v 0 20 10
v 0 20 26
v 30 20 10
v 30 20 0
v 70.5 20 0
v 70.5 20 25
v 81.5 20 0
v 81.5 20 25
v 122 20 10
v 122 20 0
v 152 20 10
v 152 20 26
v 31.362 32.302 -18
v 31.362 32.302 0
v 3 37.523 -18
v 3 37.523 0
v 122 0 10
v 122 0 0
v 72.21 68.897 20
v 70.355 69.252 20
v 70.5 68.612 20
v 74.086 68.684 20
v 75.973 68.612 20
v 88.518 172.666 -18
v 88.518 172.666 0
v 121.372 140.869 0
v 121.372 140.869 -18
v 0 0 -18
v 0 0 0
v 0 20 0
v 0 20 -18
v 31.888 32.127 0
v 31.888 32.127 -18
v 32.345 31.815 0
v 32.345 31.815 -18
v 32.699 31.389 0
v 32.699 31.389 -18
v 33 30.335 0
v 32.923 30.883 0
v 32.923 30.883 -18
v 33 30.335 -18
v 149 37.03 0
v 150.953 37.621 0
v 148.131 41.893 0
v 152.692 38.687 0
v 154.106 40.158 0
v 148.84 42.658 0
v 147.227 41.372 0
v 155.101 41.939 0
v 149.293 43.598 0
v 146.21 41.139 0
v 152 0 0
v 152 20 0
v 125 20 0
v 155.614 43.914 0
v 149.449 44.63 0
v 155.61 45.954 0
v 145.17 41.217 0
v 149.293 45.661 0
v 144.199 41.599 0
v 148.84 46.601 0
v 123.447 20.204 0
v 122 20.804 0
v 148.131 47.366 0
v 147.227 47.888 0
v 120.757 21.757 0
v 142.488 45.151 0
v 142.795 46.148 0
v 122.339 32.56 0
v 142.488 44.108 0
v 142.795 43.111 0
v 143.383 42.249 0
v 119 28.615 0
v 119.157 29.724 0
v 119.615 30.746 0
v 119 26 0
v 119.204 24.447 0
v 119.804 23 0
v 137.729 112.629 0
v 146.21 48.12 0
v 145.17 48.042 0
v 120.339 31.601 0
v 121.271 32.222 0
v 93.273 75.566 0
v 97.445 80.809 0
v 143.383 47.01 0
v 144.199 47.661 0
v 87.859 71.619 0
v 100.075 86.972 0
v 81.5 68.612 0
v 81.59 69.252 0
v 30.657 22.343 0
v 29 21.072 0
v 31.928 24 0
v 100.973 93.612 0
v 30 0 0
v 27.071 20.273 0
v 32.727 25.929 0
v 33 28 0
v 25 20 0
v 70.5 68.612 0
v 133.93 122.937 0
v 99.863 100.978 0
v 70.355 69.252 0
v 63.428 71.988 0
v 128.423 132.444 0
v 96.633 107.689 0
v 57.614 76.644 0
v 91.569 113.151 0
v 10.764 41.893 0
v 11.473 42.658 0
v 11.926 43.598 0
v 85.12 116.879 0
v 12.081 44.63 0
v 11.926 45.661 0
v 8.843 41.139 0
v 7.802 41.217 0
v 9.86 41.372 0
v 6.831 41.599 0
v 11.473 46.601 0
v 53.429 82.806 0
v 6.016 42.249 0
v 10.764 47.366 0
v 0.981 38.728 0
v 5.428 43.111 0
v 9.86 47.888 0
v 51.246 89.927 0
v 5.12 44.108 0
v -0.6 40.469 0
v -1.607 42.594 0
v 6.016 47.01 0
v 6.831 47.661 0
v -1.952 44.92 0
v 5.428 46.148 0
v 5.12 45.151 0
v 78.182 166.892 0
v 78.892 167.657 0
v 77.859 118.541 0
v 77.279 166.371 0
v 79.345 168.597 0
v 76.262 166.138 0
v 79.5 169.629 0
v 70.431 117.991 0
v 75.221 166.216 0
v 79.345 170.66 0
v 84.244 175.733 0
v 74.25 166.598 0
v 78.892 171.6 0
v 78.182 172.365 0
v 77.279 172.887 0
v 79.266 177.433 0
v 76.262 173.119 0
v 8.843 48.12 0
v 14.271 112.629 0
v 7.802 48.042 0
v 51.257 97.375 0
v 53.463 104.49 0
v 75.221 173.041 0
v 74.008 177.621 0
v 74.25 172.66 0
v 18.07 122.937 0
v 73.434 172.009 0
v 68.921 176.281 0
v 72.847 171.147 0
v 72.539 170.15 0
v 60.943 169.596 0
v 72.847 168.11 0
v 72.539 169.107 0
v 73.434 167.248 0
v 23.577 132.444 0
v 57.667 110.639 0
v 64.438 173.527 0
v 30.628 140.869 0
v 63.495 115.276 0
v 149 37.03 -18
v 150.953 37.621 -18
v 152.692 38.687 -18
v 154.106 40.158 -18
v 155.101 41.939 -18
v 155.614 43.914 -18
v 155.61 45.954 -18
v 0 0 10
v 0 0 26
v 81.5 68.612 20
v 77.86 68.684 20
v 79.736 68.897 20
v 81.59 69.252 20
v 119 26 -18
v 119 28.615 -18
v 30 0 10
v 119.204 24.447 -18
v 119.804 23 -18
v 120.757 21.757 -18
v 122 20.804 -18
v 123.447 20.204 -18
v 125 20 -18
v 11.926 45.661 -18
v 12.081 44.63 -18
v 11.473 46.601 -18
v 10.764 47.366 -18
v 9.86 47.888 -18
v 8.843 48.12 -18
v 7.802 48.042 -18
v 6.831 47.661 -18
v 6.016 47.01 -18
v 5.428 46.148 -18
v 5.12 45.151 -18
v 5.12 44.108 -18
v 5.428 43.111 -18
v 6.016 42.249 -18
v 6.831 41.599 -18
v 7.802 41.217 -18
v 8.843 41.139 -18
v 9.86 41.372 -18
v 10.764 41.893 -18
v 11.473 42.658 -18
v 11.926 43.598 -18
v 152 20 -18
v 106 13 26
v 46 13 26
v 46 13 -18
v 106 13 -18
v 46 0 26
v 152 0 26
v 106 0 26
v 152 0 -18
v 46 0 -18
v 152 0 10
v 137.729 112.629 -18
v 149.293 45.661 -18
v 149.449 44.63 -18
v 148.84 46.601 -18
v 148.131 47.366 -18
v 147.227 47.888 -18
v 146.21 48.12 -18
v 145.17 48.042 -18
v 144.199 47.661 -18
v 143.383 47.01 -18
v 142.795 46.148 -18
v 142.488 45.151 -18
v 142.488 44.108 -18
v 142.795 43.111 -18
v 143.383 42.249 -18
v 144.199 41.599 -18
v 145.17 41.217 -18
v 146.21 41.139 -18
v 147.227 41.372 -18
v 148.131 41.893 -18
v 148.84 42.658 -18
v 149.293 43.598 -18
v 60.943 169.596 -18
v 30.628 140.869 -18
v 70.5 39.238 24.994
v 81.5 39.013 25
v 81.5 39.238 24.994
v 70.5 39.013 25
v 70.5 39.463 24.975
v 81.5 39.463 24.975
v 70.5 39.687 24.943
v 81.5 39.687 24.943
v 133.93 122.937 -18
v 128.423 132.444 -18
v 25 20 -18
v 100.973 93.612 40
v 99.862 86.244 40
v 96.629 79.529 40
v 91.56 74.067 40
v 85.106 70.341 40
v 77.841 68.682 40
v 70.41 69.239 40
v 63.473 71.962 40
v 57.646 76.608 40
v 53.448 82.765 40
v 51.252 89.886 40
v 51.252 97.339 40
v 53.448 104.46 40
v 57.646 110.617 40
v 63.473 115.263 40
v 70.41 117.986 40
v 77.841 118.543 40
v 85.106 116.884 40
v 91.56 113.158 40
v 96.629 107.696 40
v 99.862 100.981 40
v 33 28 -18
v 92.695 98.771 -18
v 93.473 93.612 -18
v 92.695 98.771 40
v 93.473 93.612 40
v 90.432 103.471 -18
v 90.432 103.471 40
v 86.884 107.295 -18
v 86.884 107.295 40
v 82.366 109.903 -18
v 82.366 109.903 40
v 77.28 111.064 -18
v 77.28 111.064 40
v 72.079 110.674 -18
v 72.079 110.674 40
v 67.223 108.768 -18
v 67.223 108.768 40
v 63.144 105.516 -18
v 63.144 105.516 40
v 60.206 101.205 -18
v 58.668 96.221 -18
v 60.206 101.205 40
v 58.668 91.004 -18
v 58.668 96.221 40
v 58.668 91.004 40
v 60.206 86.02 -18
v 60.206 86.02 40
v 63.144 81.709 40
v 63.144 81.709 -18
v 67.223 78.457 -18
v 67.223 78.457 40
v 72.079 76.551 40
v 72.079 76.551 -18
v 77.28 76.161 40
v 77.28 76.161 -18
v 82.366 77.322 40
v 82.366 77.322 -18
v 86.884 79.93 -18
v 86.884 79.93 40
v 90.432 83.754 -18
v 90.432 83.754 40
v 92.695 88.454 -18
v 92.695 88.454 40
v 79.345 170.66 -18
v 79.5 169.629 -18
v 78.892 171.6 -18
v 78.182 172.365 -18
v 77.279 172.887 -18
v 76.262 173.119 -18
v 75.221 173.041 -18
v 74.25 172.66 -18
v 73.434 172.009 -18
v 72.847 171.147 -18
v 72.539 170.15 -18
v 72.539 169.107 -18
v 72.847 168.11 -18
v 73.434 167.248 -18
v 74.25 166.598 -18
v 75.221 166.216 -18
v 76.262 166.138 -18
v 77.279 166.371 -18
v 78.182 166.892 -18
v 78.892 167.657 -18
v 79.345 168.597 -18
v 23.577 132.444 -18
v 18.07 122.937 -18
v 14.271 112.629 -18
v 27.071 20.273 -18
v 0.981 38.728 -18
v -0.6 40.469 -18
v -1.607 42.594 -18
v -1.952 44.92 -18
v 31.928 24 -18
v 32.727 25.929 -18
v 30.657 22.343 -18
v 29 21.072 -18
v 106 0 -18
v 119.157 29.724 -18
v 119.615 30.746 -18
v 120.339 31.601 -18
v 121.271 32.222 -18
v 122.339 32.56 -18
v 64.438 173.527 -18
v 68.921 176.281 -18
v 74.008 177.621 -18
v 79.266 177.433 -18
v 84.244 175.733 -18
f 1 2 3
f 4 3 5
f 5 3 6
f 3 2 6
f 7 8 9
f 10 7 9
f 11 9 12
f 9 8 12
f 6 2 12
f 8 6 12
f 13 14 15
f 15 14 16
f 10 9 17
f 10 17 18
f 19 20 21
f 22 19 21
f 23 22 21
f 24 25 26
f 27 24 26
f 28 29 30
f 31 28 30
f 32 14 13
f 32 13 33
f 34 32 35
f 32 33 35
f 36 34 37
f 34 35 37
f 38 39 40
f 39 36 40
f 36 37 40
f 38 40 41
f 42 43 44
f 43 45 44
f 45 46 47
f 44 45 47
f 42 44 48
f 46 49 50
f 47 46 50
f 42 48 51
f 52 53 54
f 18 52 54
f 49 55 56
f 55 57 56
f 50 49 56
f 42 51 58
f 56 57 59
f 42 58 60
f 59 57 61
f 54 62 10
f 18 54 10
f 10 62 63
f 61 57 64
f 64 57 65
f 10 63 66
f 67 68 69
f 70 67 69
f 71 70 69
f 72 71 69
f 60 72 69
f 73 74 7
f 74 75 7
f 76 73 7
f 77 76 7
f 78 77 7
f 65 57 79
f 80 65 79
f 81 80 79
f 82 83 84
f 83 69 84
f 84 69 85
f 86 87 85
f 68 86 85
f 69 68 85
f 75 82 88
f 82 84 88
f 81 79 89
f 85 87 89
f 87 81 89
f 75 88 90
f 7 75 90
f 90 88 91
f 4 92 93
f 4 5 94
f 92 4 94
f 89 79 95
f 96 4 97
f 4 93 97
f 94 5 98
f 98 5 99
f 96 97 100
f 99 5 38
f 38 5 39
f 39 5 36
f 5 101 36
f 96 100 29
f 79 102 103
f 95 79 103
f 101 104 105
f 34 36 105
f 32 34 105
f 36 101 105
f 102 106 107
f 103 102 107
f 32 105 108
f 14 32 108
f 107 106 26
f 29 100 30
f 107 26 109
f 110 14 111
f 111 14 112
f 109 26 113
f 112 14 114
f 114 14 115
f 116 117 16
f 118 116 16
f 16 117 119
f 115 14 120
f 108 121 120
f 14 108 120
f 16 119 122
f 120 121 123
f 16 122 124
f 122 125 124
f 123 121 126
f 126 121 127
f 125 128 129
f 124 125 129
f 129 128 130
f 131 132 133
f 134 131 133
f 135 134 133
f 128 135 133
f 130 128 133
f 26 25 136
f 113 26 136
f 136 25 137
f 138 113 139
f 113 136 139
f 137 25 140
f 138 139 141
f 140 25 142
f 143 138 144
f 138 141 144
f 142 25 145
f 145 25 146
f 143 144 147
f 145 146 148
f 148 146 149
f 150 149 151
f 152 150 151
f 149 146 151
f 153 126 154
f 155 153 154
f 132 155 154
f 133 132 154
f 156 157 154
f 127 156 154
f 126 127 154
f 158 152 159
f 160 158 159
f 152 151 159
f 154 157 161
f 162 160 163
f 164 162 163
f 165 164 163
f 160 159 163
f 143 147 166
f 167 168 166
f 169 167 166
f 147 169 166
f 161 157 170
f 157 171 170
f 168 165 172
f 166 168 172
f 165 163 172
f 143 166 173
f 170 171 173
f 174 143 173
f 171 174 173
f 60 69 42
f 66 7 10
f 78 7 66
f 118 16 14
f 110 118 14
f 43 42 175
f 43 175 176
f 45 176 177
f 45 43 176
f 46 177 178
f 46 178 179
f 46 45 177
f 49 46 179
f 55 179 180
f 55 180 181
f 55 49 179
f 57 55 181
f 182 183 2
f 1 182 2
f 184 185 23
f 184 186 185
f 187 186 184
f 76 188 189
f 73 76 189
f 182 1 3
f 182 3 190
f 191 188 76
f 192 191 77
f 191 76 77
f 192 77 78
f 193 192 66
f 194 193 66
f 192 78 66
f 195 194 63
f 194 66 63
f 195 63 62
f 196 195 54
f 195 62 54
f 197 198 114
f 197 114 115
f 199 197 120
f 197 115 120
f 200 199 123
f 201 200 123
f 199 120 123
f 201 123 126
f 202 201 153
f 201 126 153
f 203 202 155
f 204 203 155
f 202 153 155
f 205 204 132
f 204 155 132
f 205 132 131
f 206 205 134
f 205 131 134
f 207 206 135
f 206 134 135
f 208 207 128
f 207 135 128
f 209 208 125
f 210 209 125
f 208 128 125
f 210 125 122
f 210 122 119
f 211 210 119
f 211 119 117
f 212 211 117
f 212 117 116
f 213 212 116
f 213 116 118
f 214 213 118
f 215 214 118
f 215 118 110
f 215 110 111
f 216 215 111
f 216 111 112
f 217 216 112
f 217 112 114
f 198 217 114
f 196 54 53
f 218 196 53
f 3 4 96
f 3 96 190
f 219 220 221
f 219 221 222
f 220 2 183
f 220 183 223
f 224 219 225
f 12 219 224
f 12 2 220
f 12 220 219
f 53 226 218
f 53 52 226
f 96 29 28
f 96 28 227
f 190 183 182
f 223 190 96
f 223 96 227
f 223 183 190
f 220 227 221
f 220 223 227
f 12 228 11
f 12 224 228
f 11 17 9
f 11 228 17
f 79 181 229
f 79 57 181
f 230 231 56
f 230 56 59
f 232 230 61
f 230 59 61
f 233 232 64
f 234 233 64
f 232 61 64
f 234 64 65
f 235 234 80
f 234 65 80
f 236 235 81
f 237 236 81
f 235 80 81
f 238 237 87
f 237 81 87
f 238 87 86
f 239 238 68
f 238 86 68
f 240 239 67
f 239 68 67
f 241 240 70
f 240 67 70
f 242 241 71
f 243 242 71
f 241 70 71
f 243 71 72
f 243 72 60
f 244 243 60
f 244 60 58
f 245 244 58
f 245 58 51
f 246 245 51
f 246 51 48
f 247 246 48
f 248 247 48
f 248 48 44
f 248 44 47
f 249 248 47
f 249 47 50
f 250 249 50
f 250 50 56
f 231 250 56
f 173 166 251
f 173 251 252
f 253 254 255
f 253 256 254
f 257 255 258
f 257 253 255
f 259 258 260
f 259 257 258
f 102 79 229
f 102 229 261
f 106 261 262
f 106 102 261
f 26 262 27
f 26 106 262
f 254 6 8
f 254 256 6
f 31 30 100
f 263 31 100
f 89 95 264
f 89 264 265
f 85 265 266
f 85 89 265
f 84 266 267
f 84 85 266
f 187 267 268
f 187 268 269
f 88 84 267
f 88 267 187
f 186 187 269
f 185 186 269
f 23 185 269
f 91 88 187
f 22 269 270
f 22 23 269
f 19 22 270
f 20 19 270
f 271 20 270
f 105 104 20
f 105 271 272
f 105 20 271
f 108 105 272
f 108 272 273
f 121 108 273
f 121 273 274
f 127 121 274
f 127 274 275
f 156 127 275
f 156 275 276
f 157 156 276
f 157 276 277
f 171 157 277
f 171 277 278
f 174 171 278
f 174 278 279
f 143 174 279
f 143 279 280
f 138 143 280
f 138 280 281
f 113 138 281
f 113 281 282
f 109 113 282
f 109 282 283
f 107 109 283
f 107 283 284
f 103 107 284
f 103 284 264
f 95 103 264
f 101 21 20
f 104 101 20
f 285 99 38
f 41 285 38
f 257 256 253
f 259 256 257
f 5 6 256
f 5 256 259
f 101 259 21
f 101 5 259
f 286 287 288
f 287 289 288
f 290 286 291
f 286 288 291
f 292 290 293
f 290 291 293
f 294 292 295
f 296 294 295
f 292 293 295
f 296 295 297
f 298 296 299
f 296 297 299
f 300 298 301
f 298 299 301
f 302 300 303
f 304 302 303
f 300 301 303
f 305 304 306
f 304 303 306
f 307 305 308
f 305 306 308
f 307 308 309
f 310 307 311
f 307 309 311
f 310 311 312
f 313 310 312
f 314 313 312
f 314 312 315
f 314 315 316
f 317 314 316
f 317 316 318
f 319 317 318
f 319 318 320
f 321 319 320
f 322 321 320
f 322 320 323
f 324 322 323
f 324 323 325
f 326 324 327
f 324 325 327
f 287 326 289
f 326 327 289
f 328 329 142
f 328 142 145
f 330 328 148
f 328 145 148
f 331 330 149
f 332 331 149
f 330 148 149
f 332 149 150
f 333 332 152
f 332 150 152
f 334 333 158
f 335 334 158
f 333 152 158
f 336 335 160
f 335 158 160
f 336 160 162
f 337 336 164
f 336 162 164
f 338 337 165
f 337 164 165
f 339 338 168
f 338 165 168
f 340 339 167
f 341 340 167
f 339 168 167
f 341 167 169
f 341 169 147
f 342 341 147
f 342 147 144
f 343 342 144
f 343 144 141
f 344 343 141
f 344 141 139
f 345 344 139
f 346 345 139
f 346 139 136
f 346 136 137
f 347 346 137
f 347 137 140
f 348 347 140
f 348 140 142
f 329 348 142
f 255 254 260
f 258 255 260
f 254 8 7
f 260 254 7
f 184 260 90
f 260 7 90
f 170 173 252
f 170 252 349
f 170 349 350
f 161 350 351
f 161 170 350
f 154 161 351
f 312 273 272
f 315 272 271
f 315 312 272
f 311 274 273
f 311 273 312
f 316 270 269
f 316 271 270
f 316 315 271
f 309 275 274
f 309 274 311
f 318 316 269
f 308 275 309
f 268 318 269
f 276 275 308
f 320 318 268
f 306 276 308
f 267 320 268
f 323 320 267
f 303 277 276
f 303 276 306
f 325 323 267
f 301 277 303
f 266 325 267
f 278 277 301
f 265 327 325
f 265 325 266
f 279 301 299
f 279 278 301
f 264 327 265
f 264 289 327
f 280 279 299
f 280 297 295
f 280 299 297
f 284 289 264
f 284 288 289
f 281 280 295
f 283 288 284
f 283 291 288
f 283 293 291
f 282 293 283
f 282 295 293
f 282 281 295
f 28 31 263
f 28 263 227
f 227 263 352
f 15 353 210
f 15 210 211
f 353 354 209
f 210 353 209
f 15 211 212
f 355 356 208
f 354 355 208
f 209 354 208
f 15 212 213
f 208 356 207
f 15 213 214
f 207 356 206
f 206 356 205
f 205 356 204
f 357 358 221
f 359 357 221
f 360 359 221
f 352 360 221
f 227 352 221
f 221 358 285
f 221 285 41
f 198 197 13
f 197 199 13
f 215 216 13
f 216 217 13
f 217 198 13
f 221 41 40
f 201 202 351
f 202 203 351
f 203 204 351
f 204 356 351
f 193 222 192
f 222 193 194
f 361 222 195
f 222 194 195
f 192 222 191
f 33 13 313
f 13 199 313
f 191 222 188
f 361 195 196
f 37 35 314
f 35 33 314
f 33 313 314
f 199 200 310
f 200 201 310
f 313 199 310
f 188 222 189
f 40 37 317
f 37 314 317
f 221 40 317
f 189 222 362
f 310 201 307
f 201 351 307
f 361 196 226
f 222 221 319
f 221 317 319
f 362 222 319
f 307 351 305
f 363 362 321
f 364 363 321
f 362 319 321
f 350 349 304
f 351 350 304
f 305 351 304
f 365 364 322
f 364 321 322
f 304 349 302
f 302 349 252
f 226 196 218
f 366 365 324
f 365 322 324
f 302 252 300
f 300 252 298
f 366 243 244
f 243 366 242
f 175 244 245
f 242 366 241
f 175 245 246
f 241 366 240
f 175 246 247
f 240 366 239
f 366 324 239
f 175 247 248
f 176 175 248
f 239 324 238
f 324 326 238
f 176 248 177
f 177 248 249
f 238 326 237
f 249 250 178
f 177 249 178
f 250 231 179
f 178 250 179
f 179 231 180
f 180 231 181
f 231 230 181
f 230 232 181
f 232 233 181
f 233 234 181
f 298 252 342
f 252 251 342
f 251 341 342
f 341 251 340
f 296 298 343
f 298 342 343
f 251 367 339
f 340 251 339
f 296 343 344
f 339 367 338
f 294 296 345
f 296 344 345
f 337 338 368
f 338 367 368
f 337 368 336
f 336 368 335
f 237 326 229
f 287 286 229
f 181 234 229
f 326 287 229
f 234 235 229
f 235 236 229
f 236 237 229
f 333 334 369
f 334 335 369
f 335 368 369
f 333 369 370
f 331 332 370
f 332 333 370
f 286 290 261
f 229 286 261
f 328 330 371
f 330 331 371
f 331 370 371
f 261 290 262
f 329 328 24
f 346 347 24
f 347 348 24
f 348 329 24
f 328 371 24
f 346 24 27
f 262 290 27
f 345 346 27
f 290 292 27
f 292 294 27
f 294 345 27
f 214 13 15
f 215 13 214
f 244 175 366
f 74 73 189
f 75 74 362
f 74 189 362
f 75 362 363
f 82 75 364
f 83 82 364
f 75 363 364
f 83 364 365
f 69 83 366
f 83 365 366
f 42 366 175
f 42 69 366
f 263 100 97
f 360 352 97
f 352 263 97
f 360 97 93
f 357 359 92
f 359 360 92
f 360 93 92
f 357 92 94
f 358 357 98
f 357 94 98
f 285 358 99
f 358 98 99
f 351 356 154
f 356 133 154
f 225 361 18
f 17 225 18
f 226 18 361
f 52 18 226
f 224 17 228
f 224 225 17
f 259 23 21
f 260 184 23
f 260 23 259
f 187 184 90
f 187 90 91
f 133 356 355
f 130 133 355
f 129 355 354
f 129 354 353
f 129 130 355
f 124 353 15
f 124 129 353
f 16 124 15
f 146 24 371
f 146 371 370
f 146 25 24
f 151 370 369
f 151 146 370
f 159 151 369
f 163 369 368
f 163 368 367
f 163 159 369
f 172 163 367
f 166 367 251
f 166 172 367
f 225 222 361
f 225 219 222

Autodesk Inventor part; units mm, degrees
ref_plane "YZ Plane" through (0, 0, 0) normal (1, 0, 0) x (0, 1, 0)
ref_plane "XZ Plane" through (0, 0, 0) normal (0, 1, 0) x (-1, 0, 0)
ref_plane "XY Plane" through (0, 0, 0) normal (0, 0, 1) x (1, 0, 0)
sketch "Sketch1" plane through (0, 0, 0) normal (0, 0, 1) x (1, 0, 0)
  line L0 (0, 0) -> (46, 0)
  line L1 (46, 0) -> (46, 13)
  line L2 (46, 13) -> (106, 13)
  line L3 (106, 13) -> (106, 0)
  line L4 (106, 0) -> (152, 0)
  line L5 (152, 0) -> (152, 20)
  line L6 (152, 20) -> (119, 20)
  line L7 (119, 20) -> (119, 32)
  line L8 (0, 0) -> (0, 20)
  line L9 (0, 20) -> (33, 20)
  line L10 (33, 20) -> (33, 32)
  arc A0 (88.5182, 172.6658) -> (60.9434, 169.5955) centre (76, 159.7315) ccw
  line L11 (88.5182, 172.6658) -> (121.3723, 140.8686)
  arc A1 (-1.0837, 48.545) -> (6.2613, 36.9223) centre (6.0476, 44.9195) ccw
  arc A2 (149, 37.0296) -> (155.0632, 47.9932) centre (147.6772, 44.9195) ccw
  line L12 (60.9434, 169.5955) -> (30.6277, 140.8686)
  line L13 (33, 32) -> (3, 37.5227)
  line L14 (119, 32) -> (149, 37.0296)
  line L15 (155.6101, 45.954) -> (137.729, 112.6291)
  line L16 (-1.9524, 44.9195) -> (14.271, 112.6291)
  arc A3 (137.9006, 111.9892) -> (119.6299, 142.555) centre (76, 95.7315) ccw
  arc A4 (33.3683, 143.4655) -> (13.316, 108.6436) centre (76, 95.7315) ccw
  point P0 (76, 13)
  dimension "d5" = 46
  dimension "d6" = 13
  dimension "d7" = 60
  dimension "d8" = 46
  dimension "d9" = 20
  dimension "d10" = 33
  dimension "d11" = 12
  dimension "d12" = 33
  dimension "d13" = 12
  dimension "d15" = 36
  dimension "d22" = 16
  dimension "d23" = 16
  dimension "d24" = 30
  dimension "d25" = 30
  dimension "d42" = 86
extrude "Extrusion1" add sketch "Sketch1" against normal blind 18 contours L8 L9 L10 L13 A1 L16 A4 L12 A0 L11 A3 L15 A2 L14 L7 L6 L5 L4 L3 L2 L1 L0
sketch "Sketch2" plane through (46, 0, 0) normal (1, 0, 0) x (0, 0, -1)
  point P0 (0, 0)
sketch "Sketch3" plane through (0, 0, 0) normal (0, 0, 1) x (1, 0, 0)
  line L0 (119, 20) -> (152, 20) projected
  line L1 (0, 20) -> (152, 20)
  line L2 (152, 20) -> (152, 0) projected
  line L3 (152, 20) -> (152, 0)
  line L4 (152, 0) -> (106, 0) projected
  line L5 (152, 0) -> (106, 0)
  line L6 (106, 0) -> (106, 13) projected
  line L7 (106, 0) -> (106, 13)
  line L8 (106, 13) -> (46, 13) projected
  line L9 (106, 13) -> (46, 13)
  line L10 (46, 13) -> (46, 0) projected
  line L11 (46, 13) -> (46, 0)
  line L12 (46, 0) -> (0, 0) projected
  line L13 (46, 0) -> (0, 0)
  line L14 (0, 0) -> (0, 20)
extrude "Extrusion2" add sketch "Sketch3" along normal blind 26
sketch "Sketch4" plane through (33, 20, 0) normal (0, 1, 0) x (1, 0, 0)
  point P0 (-33, 0)
sketch "Sketch5" plane through (152, 0, -18) normal (1, 0, 0) x (0, 0, -1)
  line L0 (0, 0) -> (-44, 0) projected
  line L1 (-28, 0) -> (-28, 20)
  line L2 (0, 20) -> (-44, 20) projected
  line L3 (-28, 20) -> (-18, 20)
  line L4 (-18, 20) -> (-18, 0)
  dimension "d32" = 16
  dimension "d33" = 10
extrude "Extrusion3" cut sketch "Sketch5" against normal blind 30
sketch "Sketch6" plane through (0, 0, 0) normal (0, 0, 1) x (1, 0, 0)
  line L0 (119, 20) -> (152, 20) projected
  point P0 (0, 0)
fillet "Fillet1" radius 4 1 edges at (119, 32, -9)
fillet "Fillet2" radius 6 1 edges at (119, 20, -9)
sketch "Sketch7" plane through (0, 0, -18) normal (-1, 0, 0) x (0, 0, 1)
  line L0 (0, 0) -> (44, 0) projected
  line L1 (18, 0) -> (18, 20)
  line L2 (18, 20) -> (0, 20) projected
  line L3 (18, 20) -> (28, 20)
  line L4 (0, 20) -> (44, 20) projected
  line L5 (28, 20) -> (28, 0)
  dimension "d38" = 18
  dimension "d39" = 10
extrude "Extrusion4" cut sketch "Sketch7" against normal blind 30
sketch "Sketch8" plane through (0, 0, 0) normal (0, 0, 1) x (1, 0, 0)
  point P0 (0, 0)
fillet "Fillet3" radius 8 1 edges at (33, 20, -9)
fillet "Fillet4" radius 2 1 edges at (33, 32, -9)
sketch "Sketch9" plane through (0, 0, 0) normal (0, 0, 1) x (1, 0, 0)
  line L0 (46, 13) -> (106, 13) projected
  arc A0 (88.5182, 172.6658) -> (60.9434, 169.5955) centre (76, 159.7315) ccw projected
  line L1 (76, 68) -> (76, 20)
  line L2 (30, 20) -> (122, 20) projected
  line L3 (76, 20) -> (81.5, 20)
  line L4 (81.5, 20) -> (81.5, 68.6125)
  line L5 (76, 20) -> (70.5, 20)
  line L6 (70.5, 20) -> (70.5, 68.6125)
  line L7 (70.5, 68.6125) -> (81.5, 68.6125)
  point P0 (0, 0)
  point P1 (76, 13)
  point P2 (76, 13)
  point P3 (76, 13)
  point P4 (74.0081, 177.621)
  dimension "d47" = 164.621
  dimension "d49" = 5.5
  dimension "d50" = 5.5
  dimension "d51" = 48
extrude "Extrusion5" add sketch "Sketch9" along normal blind 25
sketch "Sketch10" plane through (0, 0, 0) normal (0, 0, 1) x (1, 0, 0)
  circle A0 centre (76, 169.6287) radius 3.5
  circle A1 centre (145.9486, 44.6297) radius 3.5
  circle A2 centre (8.5813, 44.6297) radius 3.5
  line L0 (81.5, 68.6125) -> (70.5, 68.6125) projected
  line L1 (122.3386, 32.5597) -> (149, 37.0296) projected
  line L2 (3, 37.5227) -> (31.3621, 32.3015) projected
  point P0 (0, 0)
  point P1 (76, 68.6125)
  dimension "d55" = 7
  dimension "d56" = 7
  dimension "d57" = 7
  dimension "d78" = 8
  dimension "d79" = 8
extrude "Extrusion6" cut sketch "Sketch10" against normal blind 25
sketch "Sketch11" plane through (0, 0, 0) normal (0, 0, 1) x (1, 0, 0)
  circle A0 centre (75.9727, 93.6125) radius 25
  line L0 (81.5, 68.6125) -> (70.5, 68.6125) projected
  point P0 (0, 0)
  point P1 (76, 68.6125)
  dimension "d61" = 50
  dimension "d62" = 25
extrude "Extrusion7" add sketch "Sketch11" along normal blind 40
sketch "Sketch12" plane through (75.9727, 93.6125, 40) normal (0, 0, 1) x (1, 0, 0)
  circle A0 centre (0, 0) radius 17.5
  point P0 (-75.9727, -93.6125)
  dimension "d65" = 35
extrude "Extrusion8" cut sketch "Sketch12" against normal blind 117.25
sketch "Sketch13" plane through (81.5, 20, 0) normal (1, 0, 0) x (0, 0, -1)
  line L0 (0, 48.6125) -> (-40, 48.6125) projected
  line L1 (-20, 48.6125) -> (-25, 19.3522)
  line L2 (-25, 48.6125) -> (-25, 0) projected
  line L3 (0, 48.6125) -> (-25, 48.6125) projected
  line L4 (-20, 48.6125) -> (-25, 48.6125)
  line L5 (-25, 48.6125) -> (-25, 19.3522)
  point P0 (0, -20)
  dimension "d68" = 29.2603
extrude "Extrusion9" cut sketch "Sketch13" against normal blind 15
fillet "Fillet5" radius 4 1 edges at (76, 39.3522, 25)
sketch "Sketch14" plane through (0, 0, 0) normal (0, 0, 1) x (1, 0, 0)
  circle A0 centre (75.9727, 93.6125) radius 25 projected
  arc A1 (70.3554, 69.2518) -> (81.5123, 69.234) centre (75.9727, 93.6125) ccw
  line L0 (70.5, 68.6125) -> (70.3554, 69.2518)
  line L1 (70.4332, 69.234) -> (70.3554, 69.2518)
  line L2 (70.5, 68.6125) -> (75.9727, 68.6125) projected
  line L3 (70.5, 68.6125) -> (75.9727, 68.6125)
  line L4 (70.5, 68.6125) -> (75.9727, 68.6125)
  point P0 (0, 0)
  point P1 (70.4277, 68.9321)
  dimension "d72" = 25.2956
extrude "Extrusion10" add sketch "Sketch14" along normal blind 20 contours A0 L2 L0
sketch "Sketch15" plane through (0, 0, 0) normal (0, 0, 1) x (1, 0, 0)
  line L0 (81.5, 68.6125) -> (81.5, 39.6866) projected
  line L1 (81.5, 68.6125) -> (81.5901, 69.2518)
  arc A0 (75.9727, 68.6125) -> (70.3554, 69.2518) centre (75.9727, 93.6125) ccw projected
  line L2 (75.9727, 68.6125) -> (81.5, 68.6125) projected
  arc A1 (75.9727, 68.6125) -> (81.5901, 69.2518) centre (75.9727, 93.6125) ccw
  line L3 (81.5, 68.6125) -> (75.9727, 68.6125)
  point P0 (0, 0)
  point P1 (81.545, 68.9321)
  dimension "d75" = 0.3196
extrude "Extrusion11" add sketch "Sketch15" along normal blind 20
properties part number "COMPRESSOR 1" material "Aluminum 6061-AHC"
